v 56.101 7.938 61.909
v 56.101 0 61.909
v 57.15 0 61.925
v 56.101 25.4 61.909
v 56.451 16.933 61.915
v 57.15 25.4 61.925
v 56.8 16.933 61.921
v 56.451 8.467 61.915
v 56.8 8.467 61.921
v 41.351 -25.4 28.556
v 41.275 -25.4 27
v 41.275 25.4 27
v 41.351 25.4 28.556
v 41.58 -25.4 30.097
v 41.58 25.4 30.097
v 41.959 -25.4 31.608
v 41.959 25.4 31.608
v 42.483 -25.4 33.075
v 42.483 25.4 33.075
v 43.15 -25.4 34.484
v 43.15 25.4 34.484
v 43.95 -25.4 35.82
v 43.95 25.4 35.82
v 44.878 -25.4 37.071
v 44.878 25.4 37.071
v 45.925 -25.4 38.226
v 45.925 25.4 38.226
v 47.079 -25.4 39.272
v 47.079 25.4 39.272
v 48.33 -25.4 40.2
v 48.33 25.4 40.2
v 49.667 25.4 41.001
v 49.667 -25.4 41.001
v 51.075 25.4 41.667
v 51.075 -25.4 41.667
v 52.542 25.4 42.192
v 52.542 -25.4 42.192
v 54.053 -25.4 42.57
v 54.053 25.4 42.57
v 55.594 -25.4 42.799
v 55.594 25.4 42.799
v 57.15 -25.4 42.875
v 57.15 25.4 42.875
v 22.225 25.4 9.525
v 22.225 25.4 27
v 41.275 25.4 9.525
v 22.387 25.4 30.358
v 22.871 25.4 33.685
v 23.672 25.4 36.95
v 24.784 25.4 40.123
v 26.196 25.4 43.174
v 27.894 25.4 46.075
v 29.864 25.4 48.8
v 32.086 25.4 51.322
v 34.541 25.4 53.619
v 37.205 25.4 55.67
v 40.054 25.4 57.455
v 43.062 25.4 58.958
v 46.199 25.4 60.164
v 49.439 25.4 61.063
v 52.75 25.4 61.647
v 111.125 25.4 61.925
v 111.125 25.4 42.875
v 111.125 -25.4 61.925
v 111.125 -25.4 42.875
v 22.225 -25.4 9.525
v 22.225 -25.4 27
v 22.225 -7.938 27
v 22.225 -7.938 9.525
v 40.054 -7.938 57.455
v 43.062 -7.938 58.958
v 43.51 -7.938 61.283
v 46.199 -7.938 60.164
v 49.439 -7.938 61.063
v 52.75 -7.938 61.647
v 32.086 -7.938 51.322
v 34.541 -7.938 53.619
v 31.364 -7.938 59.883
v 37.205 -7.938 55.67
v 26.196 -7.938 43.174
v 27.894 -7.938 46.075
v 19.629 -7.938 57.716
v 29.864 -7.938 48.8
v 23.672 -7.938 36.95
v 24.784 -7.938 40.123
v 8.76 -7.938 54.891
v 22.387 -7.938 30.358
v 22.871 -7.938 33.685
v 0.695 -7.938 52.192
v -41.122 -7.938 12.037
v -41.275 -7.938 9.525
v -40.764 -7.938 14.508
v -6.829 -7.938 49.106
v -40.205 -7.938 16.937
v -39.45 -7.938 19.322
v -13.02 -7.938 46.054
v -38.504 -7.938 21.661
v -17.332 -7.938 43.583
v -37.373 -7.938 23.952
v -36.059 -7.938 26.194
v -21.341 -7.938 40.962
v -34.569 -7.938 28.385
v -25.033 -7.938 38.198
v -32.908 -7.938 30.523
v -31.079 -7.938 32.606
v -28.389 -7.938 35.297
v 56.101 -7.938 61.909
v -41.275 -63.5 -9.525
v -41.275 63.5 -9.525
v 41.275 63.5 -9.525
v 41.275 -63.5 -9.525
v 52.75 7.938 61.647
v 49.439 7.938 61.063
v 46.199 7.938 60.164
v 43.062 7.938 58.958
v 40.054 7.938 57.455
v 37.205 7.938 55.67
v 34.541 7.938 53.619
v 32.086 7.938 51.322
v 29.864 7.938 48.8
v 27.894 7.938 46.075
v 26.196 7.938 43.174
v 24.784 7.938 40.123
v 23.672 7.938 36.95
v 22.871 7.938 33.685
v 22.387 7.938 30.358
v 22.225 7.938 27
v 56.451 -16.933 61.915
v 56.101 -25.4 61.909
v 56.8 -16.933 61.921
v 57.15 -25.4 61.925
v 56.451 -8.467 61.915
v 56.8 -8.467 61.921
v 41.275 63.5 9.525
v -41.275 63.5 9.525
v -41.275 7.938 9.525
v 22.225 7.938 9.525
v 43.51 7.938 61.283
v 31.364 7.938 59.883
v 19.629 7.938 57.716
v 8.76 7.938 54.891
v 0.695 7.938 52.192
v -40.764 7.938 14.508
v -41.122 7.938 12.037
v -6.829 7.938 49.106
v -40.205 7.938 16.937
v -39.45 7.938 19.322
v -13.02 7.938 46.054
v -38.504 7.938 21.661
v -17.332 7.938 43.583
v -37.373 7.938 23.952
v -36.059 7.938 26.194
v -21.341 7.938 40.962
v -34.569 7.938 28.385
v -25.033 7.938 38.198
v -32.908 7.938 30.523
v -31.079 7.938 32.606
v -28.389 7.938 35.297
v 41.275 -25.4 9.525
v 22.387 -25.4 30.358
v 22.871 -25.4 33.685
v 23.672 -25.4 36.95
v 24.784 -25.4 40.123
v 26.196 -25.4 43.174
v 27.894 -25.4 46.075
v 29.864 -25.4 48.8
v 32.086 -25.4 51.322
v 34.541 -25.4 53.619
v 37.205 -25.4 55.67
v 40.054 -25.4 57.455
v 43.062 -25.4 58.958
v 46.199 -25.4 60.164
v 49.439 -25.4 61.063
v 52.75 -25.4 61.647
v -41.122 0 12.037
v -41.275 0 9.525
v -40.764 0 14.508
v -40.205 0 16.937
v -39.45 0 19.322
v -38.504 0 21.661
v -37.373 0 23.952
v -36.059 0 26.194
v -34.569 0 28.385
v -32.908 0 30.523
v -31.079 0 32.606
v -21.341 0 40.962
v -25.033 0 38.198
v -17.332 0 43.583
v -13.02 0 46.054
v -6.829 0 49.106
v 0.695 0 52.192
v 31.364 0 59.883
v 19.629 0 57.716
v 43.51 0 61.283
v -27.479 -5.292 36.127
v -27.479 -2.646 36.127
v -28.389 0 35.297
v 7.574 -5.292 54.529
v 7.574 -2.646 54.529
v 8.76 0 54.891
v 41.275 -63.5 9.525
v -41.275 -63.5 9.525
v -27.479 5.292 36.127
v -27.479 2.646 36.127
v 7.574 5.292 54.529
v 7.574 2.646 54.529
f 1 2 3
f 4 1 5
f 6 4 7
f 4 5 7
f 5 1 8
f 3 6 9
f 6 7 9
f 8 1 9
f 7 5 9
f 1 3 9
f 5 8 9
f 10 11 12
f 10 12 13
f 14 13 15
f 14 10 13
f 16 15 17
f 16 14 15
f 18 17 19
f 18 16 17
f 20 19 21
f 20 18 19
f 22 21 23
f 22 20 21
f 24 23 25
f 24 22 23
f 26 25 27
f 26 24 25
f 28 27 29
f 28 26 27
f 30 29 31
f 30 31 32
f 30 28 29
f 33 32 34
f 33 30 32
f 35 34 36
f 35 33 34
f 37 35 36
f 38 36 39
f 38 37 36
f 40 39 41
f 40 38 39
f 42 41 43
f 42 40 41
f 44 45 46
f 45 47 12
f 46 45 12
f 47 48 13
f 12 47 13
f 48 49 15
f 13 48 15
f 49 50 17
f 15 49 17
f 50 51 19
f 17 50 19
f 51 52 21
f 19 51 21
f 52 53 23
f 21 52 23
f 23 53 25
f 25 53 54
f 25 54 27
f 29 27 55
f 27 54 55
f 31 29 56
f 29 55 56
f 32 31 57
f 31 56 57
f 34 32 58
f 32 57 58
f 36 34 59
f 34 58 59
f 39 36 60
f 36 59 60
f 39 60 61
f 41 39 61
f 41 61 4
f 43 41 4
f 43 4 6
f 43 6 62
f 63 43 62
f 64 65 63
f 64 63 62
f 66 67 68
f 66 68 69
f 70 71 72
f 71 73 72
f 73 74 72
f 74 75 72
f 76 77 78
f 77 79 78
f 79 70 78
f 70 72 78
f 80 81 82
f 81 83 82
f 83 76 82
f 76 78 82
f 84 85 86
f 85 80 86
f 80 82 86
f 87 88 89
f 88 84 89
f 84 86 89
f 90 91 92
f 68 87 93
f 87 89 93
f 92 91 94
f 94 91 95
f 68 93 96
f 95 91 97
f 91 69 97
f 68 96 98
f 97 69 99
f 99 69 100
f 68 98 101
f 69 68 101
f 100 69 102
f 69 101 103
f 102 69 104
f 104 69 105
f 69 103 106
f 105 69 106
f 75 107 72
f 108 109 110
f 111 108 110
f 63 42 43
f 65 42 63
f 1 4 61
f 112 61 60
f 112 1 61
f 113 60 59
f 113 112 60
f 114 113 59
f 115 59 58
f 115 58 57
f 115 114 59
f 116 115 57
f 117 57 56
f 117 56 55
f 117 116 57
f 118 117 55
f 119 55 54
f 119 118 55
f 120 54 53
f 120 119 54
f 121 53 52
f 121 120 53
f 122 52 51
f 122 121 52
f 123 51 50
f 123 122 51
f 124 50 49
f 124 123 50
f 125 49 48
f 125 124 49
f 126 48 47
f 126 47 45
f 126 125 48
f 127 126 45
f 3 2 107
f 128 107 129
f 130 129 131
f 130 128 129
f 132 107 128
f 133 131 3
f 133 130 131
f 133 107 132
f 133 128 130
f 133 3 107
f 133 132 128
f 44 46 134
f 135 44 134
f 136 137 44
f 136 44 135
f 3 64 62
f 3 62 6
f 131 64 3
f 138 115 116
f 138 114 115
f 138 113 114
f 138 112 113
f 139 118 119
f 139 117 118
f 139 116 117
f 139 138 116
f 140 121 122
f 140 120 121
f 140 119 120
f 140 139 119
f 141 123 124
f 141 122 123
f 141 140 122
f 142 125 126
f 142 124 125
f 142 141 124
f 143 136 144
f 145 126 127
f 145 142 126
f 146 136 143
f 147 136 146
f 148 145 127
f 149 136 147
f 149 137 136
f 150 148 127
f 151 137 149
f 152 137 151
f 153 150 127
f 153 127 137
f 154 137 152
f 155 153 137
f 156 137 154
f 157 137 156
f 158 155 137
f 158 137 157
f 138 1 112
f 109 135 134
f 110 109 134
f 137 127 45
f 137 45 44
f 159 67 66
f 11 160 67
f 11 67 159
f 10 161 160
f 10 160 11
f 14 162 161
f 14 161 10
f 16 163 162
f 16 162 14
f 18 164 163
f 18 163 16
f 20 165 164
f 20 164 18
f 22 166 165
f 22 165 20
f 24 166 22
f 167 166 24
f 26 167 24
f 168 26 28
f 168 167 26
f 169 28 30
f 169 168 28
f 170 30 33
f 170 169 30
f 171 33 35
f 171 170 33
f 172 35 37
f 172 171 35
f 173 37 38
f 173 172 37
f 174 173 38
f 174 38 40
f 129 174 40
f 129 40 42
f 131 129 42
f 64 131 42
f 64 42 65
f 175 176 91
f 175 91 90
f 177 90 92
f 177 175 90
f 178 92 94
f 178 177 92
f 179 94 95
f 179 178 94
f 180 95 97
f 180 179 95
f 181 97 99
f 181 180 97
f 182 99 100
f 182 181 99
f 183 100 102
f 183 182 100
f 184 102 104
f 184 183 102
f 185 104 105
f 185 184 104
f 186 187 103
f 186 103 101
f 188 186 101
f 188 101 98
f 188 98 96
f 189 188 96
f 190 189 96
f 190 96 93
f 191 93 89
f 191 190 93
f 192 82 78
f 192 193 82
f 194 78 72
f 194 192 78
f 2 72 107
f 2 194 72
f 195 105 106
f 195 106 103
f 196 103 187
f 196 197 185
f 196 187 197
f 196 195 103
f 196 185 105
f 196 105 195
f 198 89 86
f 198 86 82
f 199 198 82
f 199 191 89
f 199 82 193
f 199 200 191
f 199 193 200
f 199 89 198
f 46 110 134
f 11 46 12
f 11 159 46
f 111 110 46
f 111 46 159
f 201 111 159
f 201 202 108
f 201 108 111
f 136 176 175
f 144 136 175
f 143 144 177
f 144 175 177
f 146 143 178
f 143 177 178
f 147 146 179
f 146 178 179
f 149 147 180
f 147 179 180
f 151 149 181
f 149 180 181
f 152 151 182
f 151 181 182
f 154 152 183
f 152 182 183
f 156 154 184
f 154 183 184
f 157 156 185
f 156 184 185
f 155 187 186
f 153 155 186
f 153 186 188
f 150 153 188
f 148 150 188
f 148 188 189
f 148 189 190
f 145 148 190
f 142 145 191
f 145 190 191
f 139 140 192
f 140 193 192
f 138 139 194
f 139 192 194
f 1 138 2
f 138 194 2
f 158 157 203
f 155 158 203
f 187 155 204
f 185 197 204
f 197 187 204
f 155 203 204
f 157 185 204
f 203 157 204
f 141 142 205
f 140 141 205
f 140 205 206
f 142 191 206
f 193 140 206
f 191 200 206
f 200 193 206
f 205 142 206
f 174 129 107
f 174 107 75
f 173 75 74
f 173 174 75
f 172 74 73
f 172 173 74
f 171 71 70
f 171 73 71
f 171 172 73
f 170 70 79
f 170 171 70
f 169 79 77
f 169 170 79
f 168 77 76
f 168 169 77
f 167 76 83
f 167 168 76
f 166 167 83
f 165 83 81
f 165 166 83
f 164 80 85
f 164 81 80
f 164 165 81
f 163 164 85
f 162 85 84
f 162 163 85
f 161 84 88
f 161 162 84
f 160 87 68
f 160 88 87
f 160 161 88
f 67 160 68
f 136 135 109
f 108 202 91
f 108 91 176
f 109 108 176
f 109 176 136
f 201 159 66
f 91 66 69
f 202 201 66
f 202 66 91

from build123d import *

# Parameters (mm, degrees)
F1_DEPTH = 63.5
F2_DEPTH = 25.4
F3_DEPTH = 7.9375


with BuildPart() as f1:
    # F0 (on Front) → F1 (new body, symmetric)
    with BuildSketch(Plane.XZ):
        Polygon((22.225, 9.525), (-41.275, 9.525), (-41.275, -9.525), (41.275, -9.525), (41.275, 9.525), align=None)
    extrude(amount=F1_DEPTH, both=True)

    # F0 (on Front) → F2 (join, symmetric)
    with BuildSketch(Plane.XZ):
        with BuildLine():
            Line((22.225, 27.0002), (22.225, 9.525))
            Line((22.225, 9.525), (41.275, 9.525))
            Line((41.275, 9.525), (41.275, 27.0002))
            ThreePointArc((41.275, 27.0002), (45.92468, 38.22552), (57.15, 42.8752))
            Line((57.15, 42.8752), (60.325, 42.8752))
            Line((60.325, 42.8752), (60.325, 61.9252))
            Line((60.325, 61.9252), (57.15, 61.9252))
            add(Edge.make_bspline(
                [(56.101355, 61.909453), (56.450531, 61.915616), (56.800083, 61.920866), (57.15, 61.9252)],
                knots=[110.770194, 110.770194, 110.770194, 110.770194, 111.504536, 111.504536, 111.504536, 111.504536], degree=3))
            ThreePointArc((56.101355, 61.909453), (32.086286, 51.322327), (22.225, 27.0002))
        make_face()
        Polygon((85.725, 61.9252), (60.325, 61.9252), (60.325, 42.8752), (85.725, 42.8752), (85.725, 52.3875), align=None)
        Polygon((111.125, 61.9252), (85.725, 61.9252), (85.725, 52.3875), (85.725, 42.8752), (111.125, 42.8752), align=None)
    extrude(amount=F2_DEPTH, both=True)

    # F0 (on Front) → F3 (join, symmetric)
    with BuildSketch(Plane.XZ):
        with BuildLine():
            add(Edge.make_bspline(
                [(-41.275, 9.525), (-40.702354, 39.286222), (3.430554, 60.979856), (56.101355, 61.909453)],
                knots=[0, 0, 0, 0, 110.770194, 110.770194, 110.770194, 110.770194], degree=3))
            Line((-41.275, 9.525), (22.225, 9.525))
            Line((22.225, 9.525), (22.225, 27.0002))
            ThreePointArc((22.225, 27.0002), (32.086286, 51.322327), (56.101355, 61.909453))
        make_face()
    extrude(amount=F3_DEPTH, both=True)


solid = f1.part
